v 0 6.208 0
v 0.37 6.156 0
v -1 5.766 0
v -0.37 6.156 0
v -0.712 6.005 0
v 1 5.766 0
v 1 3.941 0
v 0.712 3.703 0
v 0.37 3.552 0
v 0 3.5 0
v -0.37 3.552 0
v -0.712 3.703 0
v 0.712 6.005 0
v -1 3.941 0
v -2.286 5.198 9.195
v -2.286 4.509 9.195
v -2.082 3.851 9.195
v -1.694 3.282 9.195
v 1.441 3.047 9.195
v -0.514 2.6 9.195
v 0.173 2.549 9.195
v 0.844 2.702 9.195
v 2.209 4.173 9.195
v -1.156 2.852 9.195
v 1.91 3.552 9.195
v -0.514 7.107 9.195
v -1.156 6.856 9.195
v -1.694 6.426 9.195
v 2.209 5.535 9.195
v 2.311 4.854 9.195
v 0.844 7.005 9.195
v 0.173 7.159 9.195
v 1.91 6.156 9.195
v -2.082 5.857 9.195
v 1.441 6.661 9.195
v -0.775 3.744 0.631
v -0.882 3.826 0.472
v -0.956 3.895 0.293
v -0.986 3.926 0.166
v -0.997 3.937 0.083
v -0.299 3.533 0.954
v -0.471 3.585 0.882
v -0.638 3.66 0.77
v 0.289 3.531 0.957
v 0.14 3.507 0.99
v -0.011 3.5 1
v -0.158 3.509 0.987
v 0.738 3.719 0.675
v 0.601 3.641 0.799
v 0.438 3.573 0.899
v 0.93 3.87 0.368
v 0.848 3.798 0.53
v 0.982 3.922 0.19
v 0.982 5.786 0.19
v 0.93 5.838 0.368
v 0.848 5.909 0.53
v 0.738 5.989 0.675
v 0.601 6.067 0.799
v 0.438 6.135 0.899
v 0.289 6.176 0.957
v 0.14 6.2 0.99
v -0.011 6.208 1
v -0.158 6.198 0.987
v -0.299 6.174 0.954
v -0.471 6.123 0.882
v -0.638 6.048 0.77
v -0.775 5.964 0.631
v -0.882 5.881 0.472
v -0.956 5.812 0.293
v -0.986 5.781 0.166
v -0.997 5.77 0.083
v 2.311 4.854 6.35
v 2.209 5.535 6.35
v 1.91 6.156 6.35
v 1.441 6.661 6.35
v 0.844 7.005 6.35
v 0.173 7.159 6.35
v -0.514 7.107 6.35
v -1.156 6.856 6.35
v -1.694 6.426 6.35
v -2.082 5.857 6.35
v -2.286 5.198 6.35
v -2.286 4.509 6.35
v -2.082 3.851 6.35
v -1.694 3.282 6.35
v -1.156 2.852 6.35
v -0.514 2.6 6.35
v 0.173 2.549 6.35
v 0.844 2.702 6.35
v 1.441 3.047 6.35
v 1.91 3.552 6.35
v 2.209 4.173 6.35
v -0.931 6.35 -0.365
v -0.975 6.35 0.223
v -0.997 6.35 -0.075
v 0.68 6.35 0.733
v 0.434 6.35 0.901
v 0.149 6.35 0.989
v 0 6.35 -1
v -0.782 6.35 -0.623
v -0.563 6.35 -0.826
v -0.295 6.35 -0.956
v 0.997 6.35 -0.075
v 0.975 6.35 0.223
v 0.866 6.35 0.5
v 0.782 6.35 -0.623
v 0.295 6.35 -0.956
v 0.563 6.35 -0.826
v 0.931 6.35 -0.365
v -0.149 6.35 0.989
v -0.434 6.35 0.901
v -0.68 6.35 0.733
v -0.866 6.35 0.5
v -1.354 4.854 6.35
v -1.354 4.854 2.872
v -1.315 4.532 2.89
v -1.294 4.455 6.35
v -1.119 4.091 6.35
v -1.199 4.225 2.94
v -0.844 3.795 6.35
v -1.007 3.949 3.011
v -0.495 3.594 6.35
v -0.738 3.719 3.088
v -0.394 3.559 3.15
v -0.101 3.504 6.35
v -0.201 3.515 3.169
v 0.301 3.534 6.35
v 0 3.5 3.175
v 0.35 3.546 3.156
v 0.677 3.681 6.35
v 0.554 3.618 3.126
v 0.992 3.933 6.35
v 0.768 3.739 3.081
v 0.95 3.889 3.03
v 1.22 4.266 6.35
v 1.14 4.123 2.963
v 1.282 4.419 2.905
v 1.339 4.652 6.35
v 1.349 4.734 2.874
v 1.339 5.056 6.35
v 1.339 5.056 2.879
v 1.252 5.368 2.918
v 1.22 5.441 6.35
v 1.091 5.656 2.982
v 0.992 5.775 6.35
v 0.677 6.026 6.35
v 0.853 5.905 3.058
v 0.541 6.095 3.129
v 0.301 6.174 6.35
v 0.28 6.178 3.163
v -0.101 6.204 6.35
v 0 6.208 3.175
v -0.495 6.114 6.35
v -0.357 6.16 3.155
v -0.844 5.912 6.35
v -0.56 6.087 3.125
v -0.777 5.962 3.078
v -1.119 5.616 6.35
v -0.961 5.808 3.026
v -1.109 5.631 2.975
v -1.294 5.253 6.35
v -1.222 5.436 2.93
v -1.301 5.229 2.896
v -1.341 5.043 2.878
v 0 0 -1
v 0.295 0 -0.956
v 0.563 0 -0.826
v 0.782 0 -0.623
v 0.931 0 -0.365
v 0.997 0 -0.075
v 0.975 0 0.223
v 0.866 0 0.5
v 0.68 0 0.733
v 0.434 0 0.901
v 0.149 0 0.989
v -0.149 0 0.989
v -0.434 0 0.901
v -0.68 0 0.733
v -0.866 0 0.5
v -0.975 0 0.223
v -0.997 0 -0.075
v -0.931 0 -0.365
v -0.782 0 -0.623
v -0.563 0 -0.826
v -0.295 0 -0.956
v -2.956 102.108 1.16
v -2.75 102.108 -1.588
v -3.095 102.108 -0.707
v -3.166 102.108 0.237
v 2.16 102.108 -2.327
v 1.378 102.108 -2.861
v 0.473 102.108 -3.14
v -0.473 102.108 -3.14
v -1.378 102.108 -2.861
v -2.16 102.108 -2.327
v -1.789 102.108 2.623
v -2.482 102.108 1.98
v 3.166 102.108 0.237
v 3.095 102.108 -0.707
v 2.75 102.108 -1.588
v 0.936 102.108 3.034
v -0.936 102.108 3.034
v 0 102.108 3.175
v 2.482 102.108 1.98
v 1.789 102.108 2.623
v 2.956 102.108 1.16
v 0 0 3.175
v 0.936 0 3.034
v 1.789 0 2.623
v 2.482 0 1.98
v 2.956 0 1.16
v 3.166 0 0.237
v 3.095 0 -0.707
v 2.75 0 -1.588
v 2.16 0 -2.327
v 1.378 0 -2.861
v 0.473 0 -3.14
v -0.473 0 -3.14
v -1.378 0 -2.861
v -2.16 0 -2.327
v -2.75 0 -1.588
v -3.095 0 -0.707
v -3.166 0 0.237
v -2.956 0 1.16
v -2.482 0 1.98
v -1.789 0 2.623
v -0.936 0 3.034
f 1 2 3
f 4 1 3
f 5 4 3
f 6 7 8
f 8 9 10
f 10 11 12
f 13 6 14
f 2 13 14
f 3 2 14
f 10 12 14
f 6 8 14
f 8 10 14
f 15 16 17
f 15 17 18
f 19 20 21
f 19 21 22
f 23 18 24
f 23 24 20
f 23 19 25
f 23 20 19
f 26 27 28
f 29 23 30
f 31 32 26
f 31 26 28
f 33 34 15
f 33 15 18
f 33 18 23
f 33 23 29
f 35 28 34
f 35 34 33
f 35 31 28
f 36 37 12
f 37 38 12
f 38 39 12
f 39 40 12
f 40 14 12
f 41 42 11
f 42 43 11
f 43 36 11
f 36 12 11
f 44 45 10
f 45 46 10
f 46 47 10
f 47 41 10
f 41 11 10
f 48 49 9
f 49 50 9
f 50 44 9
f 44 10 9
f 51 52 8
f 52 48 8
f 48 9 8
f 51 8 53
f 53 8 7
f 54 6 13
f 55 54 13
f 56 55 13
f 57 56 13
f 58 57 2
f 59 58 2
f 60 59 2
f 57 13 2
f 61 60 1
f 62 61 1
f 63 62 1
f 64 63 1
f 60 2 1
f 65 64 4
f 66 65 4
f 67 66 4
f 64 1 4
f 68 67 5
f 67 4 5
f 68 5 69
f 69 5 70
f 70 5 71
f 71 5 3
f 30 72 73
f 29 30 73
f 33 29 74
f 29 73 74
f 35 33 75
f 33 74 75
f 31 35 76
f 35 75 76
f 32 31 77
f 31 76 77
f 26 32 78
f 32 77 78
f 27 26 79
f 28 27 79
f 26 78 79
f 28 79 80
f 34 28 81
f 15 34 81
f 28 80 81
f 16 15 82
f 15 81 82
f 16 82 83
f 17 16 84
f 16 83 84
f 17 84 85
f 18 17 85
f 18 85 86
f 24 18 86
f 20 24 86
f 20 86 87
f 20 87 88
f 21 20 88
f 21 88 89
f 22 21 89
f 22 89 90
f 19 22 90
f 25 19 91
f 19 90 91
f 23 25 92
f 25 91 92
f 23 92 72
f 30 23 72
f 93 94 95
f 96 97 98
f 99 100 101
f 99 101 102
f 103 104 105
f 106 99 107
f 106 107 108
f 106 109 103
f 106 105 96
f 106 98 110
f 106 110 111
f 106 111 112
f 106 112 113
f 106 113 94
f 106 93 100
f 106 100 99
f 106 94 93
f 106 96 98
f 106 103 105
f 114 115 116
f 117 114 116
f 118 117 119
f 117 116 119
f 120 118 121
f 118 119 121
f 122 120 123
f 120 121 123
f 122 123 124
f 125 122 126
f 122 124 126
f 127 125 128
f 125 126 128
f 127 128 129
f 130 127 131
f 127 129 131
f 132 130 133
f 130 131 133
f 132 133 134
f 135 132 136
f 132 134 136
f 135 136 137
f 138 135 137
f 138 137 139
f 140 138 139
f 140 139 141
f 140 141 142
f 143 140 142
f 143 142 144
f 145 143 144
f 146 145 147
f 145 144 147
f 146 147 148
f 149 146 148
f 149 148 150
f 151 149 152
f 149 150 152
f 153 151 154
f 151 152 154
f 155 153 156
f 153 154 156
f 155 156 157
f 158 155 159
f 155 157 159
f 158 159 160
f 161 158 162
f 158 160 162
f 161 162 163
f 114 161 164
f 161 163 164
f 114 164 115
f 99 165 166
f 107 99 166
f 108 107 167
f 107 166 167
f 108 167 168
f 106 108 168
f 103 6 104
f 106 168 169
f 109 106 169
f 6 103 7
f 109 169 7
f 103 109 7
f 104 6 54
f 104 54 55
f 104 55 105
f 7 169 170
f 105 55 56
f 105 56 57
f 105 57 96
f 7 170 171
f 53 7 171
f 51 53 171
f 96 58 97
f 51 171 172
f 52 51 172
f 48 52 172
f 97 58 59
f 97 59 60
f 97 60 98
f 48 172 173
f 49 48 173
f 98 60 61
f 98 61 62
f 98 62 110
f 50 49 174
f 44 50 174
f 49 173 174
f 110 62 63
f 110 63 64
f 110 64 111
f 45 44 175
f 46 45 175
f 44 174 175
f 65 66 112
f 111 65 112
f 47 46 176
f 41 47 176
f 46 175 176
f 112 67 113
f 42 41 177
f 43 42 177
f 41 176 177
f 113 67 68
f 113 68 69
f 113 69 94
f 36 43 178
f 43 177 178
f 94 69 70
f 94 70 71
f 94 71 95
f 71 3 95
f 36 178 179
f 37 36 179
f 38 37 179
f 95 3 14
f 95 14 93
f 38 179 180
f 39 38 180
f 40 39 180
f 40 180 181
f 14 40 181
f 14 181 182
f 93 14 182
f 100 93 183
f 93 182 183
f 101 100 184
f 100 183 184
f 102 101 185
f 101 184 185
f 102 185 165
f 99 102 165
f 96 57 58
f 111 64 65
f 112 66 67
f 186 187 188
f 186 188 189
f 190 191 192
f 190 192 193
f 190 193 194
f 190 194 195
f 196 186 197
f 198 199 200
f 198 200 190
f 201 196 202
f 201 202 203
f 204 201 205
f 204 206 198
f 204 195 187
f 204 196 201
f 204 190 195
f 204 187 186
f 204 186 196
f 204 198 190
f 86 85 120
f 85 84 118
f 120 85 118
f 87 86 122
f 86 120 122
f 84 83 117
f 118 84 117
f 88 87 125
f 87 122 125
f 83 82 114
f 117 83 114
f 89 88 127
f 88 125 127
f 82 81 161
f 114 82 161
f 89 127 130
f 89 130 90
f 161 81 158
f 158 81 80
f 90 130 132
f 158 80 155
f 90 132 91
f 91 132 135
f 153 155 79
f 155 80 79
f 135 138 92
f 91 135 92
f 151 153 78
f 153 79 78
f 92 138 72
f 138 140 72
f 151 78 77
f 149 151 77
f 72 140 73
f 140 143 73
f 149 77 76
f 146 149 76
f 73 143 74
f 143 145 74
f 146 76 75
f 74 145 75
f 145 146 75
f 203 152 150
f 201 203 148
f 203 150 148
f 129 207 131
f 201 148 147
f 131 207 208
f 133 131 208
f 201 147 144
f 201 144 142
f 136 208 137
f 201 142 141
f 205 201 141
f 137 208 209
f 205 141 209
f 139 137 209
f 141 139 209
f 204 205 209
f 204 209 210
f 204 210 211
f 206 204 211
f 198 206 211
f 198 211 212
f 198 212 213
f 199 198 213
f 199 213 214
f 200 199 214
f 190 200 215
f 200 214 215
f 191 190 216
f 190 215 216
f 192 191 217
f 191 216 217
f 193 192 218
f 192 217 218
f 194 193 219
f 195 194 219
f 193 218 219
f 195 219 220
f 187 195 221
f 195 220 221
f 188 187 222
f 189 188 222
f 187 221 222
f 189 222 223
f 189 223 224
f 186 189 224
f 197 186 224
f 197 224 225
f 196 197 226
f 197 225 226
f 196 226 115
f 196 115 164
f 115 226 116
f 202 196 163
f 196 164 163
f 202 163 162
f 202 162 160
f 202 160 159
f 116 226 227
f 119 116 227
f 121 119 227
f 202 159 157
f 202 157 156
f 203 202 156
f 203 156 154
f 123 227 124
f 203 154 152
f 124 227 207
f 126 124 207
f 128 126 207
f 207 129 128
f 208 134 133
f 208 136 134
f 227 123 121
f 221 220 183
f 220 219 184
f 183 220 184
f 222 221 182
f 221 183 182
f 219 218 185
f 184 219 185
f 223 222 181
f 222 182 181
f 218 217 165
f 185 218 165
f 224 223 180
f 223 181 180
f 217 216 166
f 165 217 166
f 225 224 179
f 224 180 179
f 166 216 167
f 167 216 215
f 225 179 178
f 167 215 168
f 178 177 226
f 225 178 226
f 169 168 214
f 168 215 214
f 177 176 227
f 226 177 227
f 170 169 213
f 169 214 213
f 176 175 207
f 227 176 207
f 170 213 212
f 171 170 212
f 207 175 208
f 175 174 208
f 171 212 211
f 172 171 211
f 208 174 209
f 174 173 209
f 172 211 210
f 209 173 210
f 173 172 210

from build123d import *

# Parameters (mm, degrees)
SKETCH1_R           = 3.175
EXTRUDE1_DEPTH      = 102.108
SKETCH2_R           = 1
EXTRUDE2_DEPTH      = 6.35
SKETCH4_R           = 1.35382
BOSS_EXTRUDE2_DEPTH = 6.35
SKETCH5_R           = 2.3114
BOSS_EXTRUDE3_DEPTH = 2.8448


with BuildPart() as part:
    # Sketch1 → Extrude1 (new body)
    with BuildSketch(Plane(origin=(0, 0, 0), x_dir=(1, 0, 0), z_dir=(0, 1, 0))):
        with Locations(Location((0, 0, 0), (0, 0, 270))):  # turned: the seam where the file's is
            Circle(SKETCH1_R)
    extrude(amount=EXTRUDE1_DEPTH)

    # Sketch2 → Extrude2 (cut)
    with BuildSketch(Plane.XZ):
        with Locations(Location((0, 0, 0), (0, 0, 270))):  # turned: the seam where the file's is
            Circle(SKETCH2_R)
    extrude(amount=-EXTRUDE2_DEPTH, mode=Mode.SUBTRACT)

    # Sketch4 → Boss-Extrude2 (add)
    with BuildSketch(Plane.XY):
        with Locations(Location((0, 4.85382, 0), (0, 0, 180))):  # turned: the seam where the file's is
            Circle(SKETCH4_R)
    extrude(amount=BOSS_EXTRUDE2_DEPTH)

    # Sketch5 → Boss-Extrude3 (add)
    with BuildSketch(Plane.XY.offset(6.35)):
        with Locations((0, 4.85382)):
            Circle(SKETCH5_R)
    extrude(amount=BOSS_EXTRUDE3_DEPTH)


solid = part.part
